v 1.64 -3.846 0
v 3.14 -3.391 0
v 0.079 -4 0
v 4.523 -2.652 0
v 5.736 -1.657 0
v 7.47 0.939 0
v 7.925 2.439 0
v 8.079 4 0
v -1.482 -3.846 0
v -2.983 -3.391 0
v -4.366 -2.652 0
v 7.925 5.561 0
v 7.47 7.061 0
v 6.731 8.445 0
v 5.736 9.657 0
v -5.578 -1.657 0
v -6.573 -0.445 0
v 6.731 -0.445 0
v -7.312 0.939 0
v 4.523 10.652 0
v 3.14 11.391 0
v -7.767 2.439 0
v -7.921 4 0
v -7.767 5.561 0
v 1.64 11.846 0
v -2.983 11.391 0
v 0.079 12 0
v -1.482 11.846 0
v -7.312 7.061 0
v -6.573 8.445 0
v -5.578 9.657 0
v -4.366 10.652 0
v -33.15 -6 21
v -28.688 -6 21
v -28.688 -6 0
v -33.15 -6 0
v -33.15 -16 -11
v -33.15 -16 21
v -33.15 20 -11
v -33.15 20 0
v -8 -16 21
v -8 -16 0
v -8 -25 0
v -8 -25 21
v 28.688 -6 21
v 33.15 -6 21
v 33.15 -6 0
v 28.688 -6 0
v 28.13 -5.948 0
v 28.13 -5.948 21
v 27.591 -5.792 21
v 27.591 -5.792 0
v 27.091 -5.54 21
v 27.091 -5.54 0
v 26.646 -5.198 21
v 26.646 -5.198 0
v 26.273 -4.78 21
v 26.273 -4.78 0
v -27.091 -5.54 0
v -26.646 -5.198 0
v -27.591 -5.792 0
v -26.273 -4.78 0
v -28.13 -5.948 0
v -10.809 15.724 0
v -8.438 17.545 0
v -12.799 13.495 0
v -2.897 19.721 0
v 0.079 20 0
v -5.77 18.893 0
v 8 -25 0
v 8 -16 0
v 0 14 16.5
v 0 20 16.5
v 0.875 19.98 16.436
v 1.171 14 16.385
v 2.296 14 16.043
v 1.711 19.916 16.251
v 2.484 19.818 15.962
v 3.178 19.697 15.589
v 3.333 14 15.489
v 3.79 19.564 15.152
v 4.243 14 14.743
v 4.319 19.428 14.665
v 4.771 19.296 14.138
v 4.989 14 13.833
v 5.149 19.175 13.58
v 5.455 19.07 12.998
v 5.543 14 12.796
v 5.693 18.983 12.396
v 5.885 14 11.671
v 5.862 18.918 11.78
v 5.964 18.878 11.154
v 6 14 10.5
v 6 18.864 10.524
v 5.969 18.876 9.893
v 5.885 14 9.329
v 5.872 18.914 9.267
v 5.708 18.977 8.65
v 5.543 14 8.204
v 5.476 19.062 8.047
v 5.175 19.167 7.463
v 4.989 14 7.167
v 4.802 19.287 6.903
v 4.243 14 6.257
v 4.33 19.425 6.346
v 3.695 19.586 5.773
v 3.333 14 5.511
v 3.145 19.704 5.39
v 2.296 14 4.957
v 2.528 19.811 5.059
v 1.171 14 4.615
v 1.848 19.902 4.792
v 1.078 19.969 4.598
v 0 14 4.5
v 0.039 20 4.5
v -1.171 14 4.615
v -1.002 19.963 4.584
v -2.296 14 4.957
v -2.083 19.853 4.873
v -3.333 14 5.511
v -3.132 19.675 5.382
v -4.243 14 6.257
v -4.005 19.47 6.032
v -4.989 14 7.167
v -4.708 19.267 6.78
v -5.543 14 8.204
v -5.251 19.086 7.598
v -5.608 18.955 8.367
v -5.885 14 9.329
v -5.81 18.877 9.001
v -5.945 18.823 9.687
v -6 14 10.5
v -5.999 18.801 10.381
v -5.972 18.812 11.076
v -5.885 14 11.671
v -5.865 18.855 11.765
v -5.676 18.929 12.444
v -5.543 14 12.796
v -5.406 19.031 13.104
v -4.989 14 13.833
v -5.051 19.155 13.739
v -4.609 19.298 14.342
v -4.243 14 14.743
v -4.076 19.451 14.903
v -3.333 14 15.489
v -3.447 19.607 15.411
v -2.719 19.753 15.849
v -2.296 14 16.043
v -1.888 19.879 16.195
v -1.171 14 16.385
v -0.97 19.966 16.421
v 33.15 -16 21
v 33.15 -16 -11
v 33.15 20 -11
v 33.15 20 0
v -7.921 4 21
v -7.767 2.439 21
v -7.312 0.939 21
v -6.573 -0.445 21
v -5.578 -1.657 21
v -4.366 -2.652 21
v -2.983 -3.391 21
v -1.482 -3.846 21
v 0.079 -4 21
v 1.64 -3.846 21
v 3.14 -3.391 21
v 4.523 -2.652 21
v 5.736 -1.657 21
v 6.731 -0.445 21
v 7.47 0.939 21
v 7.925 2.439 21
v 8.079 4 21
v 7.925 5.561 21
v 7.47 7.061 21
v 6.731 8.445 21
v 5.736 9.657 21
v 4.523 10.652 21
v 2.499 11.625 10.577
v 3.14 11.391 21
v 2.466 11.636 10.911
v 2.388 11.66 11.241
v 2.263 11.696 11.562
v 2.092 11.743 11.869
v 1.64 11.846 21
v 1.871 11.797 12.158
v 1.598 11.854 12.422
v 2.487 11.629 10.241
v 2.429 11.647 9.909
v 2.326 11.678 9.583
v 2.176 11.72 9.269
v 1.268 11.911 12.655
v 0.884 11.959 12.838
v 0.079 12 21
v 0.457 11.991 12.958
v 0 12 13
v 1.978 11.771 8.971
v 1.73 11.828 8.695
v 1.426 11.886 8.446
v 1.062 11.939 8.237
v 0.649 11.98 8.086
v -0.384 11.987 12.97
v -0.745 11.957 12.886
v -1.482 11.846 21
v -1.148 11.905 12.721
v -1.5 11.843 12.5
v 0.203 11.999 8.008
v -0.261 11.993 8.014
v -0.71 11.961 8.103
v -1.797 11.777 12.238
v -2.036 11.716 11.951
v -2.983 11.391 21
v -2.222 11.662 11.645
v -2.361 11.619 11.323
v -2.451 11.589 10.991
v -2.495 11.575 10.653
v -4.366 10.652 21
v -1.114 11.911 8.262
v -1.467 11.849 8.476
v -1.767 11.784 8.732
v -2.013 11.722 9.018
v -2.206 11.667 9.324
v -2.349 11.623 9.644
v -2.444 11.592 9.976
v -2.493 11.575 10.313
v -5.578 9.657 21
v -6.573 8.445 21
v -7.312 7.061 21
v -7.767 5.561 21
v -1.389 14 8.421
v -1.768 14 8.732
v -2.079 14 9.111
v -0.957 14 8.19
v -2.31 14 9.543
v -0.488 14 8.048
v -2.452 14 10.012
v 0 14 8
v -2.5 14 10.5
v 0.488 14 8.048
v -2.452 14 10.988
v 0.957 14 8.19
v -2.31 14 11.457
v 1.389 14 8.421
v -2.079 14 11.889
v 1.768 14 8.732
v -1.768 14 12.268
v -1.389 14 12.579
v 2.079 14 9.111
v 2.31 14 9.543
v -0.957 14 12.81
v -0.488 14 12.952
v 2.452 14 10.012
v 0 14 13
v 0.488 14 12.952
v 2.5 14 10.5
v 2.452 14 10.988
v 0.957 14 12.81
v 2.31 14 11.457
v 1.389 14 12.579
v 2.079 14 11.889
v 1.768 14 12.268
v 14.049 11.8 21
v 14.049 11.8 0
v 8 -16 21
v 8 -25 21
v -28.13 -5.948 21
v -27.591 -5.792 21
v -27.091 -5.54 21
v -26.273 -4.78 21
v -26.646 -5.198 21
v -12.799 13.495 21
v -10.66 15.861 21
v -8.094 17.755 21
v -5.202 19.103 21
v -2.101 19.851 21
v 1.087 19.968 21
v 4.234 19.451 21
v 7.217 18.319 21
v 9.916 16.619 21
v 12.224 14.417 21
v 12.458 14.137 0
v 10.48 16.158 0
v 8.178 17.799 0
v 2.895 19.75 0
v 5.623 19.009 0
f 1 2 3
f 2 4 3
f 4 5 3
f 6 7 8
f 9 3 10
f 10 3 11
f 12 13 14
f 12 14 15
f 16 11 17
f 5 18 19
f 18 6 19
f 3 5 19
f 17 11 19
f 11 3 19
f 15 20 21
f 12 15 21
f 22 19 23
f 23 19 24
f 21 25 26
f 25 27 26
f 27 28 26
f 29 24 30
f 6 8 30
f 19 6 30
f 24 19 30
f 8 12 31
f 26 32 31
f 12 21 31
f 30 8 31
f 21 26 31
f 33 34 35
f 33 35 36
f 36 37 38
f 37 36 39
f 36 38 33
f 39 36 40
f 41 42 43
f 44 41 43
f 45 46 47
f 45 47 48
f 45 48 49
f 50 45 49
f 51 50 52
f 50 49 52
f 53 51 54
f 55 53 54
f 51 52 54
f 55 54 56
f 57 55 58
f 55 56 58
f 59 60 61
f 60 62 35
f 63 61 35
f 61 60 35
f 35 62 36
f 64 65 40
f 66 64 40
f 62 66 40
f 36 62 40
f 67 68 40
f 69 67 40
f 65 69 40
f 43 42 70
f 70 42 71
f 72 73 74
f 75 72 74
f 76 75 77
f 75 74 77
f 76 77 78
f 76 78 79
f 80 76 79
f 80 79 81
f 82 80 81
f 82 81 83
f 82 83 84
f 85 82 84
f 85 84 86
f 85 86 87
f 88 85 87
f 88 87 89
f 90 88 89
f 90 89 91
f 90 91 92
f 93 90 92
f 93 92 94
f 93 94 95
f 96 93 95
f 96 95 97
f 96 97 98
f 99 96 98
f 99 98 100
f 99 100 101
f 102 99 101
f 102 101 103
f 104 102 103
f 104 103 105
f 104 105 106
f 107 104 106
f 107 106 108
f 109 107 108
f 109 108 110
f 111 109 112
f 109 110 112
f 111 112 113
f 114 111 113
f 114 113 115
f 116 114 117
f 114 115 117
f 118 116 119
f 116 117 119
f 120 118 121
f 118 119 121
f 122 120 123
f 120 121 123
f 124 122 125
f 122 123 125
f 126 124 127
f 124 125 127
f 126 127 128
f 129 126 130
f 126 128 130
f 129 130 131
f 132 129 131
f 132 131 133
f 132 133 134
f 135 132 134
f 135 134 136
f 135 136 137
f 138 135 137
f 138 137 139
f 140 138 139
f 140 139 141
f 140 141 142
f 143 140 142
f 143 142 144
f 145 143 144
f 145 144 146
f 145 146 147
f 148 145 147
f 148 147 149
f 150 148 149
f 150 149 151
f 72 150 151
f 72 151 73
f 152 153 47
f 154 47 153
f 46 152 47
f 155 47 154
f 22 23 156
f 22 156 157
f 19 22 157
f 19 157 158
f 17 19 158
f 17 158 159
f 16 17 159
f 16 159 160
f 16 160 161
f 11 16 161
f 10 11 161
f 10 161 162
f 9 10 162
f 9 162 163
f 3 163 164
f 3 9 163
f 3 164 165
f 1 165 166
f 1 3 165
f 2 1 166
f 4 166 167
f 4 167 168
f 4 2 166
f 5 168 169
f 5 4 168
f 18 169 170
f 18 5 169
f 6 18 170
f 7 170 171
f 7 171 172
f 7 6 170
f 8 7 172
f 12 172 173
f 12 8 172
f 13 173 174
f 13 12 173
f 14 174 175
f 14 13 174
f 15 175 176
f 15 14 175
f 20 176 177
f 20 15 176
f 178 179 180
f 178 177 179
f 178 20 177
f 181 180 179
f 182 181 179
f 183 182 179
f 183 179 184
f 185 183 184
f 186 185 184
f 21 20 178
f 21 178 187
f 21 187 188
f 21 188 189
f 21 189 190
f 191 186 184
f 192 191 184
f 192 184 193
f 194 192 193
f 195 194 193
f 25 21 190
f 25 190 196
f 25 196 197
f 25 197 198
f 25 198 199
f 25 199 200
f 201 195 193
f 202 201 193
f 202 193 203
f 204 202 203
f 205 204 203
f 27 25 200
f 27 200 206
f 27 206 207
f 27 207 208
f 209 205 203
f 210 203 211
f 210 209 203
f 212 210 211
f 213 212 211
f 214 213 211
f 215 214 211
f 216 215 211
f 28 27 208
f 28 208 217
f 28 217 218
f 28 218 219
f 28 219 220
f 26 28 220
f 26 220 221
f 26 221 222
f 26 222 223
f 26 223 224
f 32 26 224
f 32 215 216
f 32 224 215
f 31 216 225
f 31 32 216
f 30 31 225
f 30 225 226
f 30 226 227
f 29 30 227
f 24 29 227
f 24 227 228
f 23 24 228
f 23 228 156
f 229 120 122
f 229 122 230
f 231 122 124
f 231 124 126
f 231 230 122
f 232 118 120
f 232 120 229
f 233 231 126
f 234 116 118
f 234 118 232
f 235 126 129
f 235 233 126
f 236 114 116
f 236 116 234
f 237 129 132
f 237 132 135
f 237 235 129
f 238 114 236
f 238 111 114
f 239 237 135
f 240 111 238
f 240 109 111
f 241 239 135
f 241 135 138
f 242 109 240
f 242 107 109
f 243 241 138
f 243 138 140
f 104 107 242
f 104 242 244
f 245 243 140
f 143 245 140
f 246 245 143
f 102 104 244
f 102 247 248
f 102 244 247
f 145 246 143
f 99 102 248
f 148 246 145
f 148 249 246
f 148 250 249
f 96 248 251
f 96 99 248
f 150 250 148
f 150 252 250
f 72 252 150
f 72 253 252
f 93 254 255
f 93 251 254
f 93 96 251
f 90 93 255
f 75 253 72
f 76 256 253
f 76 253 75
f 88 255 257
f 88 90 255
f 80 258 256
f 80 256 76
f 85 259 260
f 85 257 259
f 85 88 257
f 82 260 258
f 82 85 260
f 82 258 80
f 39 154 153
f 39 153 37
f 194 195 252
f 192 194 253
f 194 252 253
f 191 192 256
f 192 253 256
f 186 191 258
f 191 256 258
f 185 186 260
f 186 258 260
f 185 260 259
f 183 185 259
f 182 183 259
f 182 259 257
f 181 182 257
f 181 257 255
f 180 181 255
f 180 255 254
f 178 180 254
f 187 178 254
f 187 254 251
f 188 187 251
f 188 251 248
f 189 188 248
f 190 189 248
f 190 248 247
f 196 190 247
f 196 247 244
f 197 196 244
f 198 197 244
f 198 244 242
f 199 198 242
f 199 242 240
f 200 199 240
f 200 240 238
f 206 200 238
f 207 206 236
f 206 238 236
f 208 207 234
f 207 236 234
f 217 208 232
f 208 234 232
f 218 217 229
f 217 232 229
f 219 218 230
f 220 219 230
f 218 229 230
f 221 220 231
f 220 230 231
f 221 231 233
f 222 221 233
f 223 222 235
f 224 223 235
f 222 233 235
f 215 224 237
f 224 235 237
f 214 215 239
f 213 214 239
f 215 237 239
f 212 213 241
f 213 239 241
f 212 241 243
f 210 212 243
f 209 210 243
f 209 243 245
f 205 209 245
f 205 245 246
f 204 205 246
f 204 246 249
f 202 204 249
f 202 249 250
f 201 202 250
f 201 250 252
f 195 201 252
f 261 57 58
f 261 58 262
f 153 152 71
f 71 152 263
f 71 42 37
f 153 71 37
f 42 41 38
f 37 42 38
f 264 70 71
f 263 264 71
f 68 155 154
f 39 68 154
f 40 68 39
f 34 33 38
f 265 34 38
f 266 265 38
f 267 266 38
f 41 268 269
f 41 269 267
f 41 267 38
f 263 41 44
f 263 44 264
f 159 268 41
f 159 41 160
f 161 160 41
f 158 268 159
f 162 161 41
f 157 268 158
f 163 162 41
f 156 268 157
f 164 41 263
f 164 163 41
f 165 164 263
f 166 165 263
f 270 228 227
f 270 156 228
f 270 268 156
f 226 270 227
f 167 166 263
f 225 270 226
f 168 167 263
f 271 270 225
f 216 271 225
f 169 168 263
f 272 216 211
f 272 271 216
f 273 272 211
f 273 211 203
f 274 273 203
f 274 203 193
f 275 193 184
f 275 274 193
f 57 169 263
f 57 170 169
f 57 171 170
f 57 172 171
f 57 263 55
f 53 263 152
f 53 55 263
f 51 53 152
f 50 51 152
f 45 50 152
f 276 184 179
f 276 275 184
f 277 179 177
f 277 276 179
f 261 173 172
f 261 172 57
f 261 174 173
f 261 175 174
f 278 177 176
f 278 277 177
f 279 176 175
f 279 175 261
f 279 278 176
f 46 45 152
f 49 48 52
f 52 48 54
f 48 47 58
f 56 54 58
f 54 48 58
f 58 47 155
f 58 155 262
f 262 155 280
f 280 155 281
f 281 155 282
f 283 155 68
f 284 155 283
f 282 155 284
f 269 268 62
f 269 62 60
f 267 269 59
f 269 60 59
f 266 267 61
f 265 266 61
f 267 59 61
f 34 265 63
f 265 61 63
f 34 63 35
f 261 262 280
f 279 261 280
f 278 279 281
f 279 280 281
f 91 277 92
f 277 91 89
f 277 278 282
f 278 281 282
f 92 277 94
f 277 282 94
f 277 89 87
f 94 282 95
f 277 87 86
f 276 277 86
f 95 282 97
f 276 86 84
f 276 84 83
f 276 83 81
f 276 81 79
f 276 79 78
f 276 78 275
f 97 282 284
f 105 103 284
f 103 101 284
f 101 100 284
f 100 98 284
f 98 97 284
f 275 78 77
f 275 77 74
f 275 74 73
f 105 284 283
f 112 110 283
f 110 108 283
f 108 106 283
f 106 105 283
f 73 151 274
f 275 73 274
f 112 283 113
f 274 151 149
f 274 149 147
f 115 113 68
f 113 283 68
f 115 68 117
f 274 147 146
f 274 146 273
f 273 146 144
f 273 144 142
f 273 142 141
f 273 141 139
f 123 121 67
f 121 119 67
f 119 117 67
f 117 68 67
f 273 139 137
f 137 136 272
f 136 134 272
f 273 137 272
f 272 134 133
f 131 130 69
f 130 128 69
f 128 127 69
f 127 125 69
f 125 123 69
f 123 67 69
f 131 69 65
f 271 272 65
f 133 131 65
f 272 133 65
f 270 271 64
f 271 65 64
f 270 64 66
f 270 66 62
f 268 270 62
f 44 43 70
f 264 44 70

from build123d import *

# Parameters (mm, degrees)
SKETCH1_R              = 8
BOSS_EXTRUDE1_DEPTH    = 21
SKETCH2_W              = 66.3
SKETCH2_H              = 36
BOSS_EXTRUDE2_DEPTH    = 11
SKETCH19_R             = 6
CUT_EXTRUDE7_DEPTH     = 6
M6_TAPPED_HOLE1_REACH  = 57.517
M6_TAPPED_HOLE1_BORE_R = 2.5


with BuildPart() as part:
    # Sketch1 → Boss-Extrude1 (new body)
    with BuildSketch(Plane.XY):
        with BuildLine():
            Line((-33.15, -16), (-8, -16))
            Line((-8, -16), (-8, -25))
            Line((-8, -25), (8, -25))
            Line((8, -25), (8, -16))
            Line((8, -16), (33.15, -16))
            Line((33.15, -16), (33.15, -6))
            Line((33.15, -6), (28.687572119, -6))
            ThreePointArc((28.687572119, -6), (27.334939497, -5.677757455), (26.272890727, -4.78025666))
            Line((26.272890727, -4.78025666), (14.048740351, 11.800177564))
            ThreePointArc((14.048740351, 11.800177564), (1.086707772, 19.968226779), (-12.799429053, 13.494702186))
            Line((-12.799429053, 13.494702186), (-26.272890727, -4.78025666))
            ThreePointArc((-26.272890727, -4.78025666), (-27.334939497, -5.677757455), (-28.687572119, -6))
            Line((-28.687572119, -6), (-33.15, -6))
            Line((-33.15, -6), (-33.15, -16))
        make_face()
        with Locations(Location((0.078871705, 4, 0), (0, 0, 180))):
            Circle(SKETCH1_R, mode=Mode.SUBTRACT)
    extrude(amount=BOSS_EXTRUDE1_DEPTH)

    # Sketch2 → Boss-Extrude2 (add)
    with BuildSketch(Plane(origin=(0, 0, 0), x_dir=(-1, 0, 0), z_dir=(0, 0, -1))):
        with Locations((0, 2)):
            Rectangle(SKETCH2_W, SKETCH2_H)
    extrude(amount=BOSS_EXTRUDE2_DEPTH)

    # Sketch19 → Cut-Extrude7 (cut)
    with BuildSketch(Plane(origin=(0, 20, 0), x_dir=(1, 0, 0), z_dir=(0, 1, 0))):
        with Locations(Location((0, -10.5, 0), (0, 0, 270))):
            Circle(SKETCH19_R)
    extrude(amount=-CUT_EXTRUDE7_DEPTH, mode=Mode.SUBTRACT)

    # M6 Tapped Hole1 bore (on position points) → M6 Tapped Hole1 (cut, up to next)
    with BuildSketch(Plane(origin=(0, 14, 10.5), x_dir=(0, 0, 1), z_dir=(0, 1, 0)), mode=Mode.PRIVATE) as m6_tapped_hole1_sk1:
        Circle(M6_TAPPED_HOLE1_BORE_R)
    m6_tapped_hole1_tool1 = extrude(m6_tapped_hole1_sk1.sketch, amount=-M6_TAPPED_HOLE1_REACH, mode=Mode.PRIVATE) & part.part
    add(m6_tapped_hole1_tool1.solids().sort_by_distance((0, 14, 10.5))[0], mode=Mode.SUBTRACT)


solid = part.part
